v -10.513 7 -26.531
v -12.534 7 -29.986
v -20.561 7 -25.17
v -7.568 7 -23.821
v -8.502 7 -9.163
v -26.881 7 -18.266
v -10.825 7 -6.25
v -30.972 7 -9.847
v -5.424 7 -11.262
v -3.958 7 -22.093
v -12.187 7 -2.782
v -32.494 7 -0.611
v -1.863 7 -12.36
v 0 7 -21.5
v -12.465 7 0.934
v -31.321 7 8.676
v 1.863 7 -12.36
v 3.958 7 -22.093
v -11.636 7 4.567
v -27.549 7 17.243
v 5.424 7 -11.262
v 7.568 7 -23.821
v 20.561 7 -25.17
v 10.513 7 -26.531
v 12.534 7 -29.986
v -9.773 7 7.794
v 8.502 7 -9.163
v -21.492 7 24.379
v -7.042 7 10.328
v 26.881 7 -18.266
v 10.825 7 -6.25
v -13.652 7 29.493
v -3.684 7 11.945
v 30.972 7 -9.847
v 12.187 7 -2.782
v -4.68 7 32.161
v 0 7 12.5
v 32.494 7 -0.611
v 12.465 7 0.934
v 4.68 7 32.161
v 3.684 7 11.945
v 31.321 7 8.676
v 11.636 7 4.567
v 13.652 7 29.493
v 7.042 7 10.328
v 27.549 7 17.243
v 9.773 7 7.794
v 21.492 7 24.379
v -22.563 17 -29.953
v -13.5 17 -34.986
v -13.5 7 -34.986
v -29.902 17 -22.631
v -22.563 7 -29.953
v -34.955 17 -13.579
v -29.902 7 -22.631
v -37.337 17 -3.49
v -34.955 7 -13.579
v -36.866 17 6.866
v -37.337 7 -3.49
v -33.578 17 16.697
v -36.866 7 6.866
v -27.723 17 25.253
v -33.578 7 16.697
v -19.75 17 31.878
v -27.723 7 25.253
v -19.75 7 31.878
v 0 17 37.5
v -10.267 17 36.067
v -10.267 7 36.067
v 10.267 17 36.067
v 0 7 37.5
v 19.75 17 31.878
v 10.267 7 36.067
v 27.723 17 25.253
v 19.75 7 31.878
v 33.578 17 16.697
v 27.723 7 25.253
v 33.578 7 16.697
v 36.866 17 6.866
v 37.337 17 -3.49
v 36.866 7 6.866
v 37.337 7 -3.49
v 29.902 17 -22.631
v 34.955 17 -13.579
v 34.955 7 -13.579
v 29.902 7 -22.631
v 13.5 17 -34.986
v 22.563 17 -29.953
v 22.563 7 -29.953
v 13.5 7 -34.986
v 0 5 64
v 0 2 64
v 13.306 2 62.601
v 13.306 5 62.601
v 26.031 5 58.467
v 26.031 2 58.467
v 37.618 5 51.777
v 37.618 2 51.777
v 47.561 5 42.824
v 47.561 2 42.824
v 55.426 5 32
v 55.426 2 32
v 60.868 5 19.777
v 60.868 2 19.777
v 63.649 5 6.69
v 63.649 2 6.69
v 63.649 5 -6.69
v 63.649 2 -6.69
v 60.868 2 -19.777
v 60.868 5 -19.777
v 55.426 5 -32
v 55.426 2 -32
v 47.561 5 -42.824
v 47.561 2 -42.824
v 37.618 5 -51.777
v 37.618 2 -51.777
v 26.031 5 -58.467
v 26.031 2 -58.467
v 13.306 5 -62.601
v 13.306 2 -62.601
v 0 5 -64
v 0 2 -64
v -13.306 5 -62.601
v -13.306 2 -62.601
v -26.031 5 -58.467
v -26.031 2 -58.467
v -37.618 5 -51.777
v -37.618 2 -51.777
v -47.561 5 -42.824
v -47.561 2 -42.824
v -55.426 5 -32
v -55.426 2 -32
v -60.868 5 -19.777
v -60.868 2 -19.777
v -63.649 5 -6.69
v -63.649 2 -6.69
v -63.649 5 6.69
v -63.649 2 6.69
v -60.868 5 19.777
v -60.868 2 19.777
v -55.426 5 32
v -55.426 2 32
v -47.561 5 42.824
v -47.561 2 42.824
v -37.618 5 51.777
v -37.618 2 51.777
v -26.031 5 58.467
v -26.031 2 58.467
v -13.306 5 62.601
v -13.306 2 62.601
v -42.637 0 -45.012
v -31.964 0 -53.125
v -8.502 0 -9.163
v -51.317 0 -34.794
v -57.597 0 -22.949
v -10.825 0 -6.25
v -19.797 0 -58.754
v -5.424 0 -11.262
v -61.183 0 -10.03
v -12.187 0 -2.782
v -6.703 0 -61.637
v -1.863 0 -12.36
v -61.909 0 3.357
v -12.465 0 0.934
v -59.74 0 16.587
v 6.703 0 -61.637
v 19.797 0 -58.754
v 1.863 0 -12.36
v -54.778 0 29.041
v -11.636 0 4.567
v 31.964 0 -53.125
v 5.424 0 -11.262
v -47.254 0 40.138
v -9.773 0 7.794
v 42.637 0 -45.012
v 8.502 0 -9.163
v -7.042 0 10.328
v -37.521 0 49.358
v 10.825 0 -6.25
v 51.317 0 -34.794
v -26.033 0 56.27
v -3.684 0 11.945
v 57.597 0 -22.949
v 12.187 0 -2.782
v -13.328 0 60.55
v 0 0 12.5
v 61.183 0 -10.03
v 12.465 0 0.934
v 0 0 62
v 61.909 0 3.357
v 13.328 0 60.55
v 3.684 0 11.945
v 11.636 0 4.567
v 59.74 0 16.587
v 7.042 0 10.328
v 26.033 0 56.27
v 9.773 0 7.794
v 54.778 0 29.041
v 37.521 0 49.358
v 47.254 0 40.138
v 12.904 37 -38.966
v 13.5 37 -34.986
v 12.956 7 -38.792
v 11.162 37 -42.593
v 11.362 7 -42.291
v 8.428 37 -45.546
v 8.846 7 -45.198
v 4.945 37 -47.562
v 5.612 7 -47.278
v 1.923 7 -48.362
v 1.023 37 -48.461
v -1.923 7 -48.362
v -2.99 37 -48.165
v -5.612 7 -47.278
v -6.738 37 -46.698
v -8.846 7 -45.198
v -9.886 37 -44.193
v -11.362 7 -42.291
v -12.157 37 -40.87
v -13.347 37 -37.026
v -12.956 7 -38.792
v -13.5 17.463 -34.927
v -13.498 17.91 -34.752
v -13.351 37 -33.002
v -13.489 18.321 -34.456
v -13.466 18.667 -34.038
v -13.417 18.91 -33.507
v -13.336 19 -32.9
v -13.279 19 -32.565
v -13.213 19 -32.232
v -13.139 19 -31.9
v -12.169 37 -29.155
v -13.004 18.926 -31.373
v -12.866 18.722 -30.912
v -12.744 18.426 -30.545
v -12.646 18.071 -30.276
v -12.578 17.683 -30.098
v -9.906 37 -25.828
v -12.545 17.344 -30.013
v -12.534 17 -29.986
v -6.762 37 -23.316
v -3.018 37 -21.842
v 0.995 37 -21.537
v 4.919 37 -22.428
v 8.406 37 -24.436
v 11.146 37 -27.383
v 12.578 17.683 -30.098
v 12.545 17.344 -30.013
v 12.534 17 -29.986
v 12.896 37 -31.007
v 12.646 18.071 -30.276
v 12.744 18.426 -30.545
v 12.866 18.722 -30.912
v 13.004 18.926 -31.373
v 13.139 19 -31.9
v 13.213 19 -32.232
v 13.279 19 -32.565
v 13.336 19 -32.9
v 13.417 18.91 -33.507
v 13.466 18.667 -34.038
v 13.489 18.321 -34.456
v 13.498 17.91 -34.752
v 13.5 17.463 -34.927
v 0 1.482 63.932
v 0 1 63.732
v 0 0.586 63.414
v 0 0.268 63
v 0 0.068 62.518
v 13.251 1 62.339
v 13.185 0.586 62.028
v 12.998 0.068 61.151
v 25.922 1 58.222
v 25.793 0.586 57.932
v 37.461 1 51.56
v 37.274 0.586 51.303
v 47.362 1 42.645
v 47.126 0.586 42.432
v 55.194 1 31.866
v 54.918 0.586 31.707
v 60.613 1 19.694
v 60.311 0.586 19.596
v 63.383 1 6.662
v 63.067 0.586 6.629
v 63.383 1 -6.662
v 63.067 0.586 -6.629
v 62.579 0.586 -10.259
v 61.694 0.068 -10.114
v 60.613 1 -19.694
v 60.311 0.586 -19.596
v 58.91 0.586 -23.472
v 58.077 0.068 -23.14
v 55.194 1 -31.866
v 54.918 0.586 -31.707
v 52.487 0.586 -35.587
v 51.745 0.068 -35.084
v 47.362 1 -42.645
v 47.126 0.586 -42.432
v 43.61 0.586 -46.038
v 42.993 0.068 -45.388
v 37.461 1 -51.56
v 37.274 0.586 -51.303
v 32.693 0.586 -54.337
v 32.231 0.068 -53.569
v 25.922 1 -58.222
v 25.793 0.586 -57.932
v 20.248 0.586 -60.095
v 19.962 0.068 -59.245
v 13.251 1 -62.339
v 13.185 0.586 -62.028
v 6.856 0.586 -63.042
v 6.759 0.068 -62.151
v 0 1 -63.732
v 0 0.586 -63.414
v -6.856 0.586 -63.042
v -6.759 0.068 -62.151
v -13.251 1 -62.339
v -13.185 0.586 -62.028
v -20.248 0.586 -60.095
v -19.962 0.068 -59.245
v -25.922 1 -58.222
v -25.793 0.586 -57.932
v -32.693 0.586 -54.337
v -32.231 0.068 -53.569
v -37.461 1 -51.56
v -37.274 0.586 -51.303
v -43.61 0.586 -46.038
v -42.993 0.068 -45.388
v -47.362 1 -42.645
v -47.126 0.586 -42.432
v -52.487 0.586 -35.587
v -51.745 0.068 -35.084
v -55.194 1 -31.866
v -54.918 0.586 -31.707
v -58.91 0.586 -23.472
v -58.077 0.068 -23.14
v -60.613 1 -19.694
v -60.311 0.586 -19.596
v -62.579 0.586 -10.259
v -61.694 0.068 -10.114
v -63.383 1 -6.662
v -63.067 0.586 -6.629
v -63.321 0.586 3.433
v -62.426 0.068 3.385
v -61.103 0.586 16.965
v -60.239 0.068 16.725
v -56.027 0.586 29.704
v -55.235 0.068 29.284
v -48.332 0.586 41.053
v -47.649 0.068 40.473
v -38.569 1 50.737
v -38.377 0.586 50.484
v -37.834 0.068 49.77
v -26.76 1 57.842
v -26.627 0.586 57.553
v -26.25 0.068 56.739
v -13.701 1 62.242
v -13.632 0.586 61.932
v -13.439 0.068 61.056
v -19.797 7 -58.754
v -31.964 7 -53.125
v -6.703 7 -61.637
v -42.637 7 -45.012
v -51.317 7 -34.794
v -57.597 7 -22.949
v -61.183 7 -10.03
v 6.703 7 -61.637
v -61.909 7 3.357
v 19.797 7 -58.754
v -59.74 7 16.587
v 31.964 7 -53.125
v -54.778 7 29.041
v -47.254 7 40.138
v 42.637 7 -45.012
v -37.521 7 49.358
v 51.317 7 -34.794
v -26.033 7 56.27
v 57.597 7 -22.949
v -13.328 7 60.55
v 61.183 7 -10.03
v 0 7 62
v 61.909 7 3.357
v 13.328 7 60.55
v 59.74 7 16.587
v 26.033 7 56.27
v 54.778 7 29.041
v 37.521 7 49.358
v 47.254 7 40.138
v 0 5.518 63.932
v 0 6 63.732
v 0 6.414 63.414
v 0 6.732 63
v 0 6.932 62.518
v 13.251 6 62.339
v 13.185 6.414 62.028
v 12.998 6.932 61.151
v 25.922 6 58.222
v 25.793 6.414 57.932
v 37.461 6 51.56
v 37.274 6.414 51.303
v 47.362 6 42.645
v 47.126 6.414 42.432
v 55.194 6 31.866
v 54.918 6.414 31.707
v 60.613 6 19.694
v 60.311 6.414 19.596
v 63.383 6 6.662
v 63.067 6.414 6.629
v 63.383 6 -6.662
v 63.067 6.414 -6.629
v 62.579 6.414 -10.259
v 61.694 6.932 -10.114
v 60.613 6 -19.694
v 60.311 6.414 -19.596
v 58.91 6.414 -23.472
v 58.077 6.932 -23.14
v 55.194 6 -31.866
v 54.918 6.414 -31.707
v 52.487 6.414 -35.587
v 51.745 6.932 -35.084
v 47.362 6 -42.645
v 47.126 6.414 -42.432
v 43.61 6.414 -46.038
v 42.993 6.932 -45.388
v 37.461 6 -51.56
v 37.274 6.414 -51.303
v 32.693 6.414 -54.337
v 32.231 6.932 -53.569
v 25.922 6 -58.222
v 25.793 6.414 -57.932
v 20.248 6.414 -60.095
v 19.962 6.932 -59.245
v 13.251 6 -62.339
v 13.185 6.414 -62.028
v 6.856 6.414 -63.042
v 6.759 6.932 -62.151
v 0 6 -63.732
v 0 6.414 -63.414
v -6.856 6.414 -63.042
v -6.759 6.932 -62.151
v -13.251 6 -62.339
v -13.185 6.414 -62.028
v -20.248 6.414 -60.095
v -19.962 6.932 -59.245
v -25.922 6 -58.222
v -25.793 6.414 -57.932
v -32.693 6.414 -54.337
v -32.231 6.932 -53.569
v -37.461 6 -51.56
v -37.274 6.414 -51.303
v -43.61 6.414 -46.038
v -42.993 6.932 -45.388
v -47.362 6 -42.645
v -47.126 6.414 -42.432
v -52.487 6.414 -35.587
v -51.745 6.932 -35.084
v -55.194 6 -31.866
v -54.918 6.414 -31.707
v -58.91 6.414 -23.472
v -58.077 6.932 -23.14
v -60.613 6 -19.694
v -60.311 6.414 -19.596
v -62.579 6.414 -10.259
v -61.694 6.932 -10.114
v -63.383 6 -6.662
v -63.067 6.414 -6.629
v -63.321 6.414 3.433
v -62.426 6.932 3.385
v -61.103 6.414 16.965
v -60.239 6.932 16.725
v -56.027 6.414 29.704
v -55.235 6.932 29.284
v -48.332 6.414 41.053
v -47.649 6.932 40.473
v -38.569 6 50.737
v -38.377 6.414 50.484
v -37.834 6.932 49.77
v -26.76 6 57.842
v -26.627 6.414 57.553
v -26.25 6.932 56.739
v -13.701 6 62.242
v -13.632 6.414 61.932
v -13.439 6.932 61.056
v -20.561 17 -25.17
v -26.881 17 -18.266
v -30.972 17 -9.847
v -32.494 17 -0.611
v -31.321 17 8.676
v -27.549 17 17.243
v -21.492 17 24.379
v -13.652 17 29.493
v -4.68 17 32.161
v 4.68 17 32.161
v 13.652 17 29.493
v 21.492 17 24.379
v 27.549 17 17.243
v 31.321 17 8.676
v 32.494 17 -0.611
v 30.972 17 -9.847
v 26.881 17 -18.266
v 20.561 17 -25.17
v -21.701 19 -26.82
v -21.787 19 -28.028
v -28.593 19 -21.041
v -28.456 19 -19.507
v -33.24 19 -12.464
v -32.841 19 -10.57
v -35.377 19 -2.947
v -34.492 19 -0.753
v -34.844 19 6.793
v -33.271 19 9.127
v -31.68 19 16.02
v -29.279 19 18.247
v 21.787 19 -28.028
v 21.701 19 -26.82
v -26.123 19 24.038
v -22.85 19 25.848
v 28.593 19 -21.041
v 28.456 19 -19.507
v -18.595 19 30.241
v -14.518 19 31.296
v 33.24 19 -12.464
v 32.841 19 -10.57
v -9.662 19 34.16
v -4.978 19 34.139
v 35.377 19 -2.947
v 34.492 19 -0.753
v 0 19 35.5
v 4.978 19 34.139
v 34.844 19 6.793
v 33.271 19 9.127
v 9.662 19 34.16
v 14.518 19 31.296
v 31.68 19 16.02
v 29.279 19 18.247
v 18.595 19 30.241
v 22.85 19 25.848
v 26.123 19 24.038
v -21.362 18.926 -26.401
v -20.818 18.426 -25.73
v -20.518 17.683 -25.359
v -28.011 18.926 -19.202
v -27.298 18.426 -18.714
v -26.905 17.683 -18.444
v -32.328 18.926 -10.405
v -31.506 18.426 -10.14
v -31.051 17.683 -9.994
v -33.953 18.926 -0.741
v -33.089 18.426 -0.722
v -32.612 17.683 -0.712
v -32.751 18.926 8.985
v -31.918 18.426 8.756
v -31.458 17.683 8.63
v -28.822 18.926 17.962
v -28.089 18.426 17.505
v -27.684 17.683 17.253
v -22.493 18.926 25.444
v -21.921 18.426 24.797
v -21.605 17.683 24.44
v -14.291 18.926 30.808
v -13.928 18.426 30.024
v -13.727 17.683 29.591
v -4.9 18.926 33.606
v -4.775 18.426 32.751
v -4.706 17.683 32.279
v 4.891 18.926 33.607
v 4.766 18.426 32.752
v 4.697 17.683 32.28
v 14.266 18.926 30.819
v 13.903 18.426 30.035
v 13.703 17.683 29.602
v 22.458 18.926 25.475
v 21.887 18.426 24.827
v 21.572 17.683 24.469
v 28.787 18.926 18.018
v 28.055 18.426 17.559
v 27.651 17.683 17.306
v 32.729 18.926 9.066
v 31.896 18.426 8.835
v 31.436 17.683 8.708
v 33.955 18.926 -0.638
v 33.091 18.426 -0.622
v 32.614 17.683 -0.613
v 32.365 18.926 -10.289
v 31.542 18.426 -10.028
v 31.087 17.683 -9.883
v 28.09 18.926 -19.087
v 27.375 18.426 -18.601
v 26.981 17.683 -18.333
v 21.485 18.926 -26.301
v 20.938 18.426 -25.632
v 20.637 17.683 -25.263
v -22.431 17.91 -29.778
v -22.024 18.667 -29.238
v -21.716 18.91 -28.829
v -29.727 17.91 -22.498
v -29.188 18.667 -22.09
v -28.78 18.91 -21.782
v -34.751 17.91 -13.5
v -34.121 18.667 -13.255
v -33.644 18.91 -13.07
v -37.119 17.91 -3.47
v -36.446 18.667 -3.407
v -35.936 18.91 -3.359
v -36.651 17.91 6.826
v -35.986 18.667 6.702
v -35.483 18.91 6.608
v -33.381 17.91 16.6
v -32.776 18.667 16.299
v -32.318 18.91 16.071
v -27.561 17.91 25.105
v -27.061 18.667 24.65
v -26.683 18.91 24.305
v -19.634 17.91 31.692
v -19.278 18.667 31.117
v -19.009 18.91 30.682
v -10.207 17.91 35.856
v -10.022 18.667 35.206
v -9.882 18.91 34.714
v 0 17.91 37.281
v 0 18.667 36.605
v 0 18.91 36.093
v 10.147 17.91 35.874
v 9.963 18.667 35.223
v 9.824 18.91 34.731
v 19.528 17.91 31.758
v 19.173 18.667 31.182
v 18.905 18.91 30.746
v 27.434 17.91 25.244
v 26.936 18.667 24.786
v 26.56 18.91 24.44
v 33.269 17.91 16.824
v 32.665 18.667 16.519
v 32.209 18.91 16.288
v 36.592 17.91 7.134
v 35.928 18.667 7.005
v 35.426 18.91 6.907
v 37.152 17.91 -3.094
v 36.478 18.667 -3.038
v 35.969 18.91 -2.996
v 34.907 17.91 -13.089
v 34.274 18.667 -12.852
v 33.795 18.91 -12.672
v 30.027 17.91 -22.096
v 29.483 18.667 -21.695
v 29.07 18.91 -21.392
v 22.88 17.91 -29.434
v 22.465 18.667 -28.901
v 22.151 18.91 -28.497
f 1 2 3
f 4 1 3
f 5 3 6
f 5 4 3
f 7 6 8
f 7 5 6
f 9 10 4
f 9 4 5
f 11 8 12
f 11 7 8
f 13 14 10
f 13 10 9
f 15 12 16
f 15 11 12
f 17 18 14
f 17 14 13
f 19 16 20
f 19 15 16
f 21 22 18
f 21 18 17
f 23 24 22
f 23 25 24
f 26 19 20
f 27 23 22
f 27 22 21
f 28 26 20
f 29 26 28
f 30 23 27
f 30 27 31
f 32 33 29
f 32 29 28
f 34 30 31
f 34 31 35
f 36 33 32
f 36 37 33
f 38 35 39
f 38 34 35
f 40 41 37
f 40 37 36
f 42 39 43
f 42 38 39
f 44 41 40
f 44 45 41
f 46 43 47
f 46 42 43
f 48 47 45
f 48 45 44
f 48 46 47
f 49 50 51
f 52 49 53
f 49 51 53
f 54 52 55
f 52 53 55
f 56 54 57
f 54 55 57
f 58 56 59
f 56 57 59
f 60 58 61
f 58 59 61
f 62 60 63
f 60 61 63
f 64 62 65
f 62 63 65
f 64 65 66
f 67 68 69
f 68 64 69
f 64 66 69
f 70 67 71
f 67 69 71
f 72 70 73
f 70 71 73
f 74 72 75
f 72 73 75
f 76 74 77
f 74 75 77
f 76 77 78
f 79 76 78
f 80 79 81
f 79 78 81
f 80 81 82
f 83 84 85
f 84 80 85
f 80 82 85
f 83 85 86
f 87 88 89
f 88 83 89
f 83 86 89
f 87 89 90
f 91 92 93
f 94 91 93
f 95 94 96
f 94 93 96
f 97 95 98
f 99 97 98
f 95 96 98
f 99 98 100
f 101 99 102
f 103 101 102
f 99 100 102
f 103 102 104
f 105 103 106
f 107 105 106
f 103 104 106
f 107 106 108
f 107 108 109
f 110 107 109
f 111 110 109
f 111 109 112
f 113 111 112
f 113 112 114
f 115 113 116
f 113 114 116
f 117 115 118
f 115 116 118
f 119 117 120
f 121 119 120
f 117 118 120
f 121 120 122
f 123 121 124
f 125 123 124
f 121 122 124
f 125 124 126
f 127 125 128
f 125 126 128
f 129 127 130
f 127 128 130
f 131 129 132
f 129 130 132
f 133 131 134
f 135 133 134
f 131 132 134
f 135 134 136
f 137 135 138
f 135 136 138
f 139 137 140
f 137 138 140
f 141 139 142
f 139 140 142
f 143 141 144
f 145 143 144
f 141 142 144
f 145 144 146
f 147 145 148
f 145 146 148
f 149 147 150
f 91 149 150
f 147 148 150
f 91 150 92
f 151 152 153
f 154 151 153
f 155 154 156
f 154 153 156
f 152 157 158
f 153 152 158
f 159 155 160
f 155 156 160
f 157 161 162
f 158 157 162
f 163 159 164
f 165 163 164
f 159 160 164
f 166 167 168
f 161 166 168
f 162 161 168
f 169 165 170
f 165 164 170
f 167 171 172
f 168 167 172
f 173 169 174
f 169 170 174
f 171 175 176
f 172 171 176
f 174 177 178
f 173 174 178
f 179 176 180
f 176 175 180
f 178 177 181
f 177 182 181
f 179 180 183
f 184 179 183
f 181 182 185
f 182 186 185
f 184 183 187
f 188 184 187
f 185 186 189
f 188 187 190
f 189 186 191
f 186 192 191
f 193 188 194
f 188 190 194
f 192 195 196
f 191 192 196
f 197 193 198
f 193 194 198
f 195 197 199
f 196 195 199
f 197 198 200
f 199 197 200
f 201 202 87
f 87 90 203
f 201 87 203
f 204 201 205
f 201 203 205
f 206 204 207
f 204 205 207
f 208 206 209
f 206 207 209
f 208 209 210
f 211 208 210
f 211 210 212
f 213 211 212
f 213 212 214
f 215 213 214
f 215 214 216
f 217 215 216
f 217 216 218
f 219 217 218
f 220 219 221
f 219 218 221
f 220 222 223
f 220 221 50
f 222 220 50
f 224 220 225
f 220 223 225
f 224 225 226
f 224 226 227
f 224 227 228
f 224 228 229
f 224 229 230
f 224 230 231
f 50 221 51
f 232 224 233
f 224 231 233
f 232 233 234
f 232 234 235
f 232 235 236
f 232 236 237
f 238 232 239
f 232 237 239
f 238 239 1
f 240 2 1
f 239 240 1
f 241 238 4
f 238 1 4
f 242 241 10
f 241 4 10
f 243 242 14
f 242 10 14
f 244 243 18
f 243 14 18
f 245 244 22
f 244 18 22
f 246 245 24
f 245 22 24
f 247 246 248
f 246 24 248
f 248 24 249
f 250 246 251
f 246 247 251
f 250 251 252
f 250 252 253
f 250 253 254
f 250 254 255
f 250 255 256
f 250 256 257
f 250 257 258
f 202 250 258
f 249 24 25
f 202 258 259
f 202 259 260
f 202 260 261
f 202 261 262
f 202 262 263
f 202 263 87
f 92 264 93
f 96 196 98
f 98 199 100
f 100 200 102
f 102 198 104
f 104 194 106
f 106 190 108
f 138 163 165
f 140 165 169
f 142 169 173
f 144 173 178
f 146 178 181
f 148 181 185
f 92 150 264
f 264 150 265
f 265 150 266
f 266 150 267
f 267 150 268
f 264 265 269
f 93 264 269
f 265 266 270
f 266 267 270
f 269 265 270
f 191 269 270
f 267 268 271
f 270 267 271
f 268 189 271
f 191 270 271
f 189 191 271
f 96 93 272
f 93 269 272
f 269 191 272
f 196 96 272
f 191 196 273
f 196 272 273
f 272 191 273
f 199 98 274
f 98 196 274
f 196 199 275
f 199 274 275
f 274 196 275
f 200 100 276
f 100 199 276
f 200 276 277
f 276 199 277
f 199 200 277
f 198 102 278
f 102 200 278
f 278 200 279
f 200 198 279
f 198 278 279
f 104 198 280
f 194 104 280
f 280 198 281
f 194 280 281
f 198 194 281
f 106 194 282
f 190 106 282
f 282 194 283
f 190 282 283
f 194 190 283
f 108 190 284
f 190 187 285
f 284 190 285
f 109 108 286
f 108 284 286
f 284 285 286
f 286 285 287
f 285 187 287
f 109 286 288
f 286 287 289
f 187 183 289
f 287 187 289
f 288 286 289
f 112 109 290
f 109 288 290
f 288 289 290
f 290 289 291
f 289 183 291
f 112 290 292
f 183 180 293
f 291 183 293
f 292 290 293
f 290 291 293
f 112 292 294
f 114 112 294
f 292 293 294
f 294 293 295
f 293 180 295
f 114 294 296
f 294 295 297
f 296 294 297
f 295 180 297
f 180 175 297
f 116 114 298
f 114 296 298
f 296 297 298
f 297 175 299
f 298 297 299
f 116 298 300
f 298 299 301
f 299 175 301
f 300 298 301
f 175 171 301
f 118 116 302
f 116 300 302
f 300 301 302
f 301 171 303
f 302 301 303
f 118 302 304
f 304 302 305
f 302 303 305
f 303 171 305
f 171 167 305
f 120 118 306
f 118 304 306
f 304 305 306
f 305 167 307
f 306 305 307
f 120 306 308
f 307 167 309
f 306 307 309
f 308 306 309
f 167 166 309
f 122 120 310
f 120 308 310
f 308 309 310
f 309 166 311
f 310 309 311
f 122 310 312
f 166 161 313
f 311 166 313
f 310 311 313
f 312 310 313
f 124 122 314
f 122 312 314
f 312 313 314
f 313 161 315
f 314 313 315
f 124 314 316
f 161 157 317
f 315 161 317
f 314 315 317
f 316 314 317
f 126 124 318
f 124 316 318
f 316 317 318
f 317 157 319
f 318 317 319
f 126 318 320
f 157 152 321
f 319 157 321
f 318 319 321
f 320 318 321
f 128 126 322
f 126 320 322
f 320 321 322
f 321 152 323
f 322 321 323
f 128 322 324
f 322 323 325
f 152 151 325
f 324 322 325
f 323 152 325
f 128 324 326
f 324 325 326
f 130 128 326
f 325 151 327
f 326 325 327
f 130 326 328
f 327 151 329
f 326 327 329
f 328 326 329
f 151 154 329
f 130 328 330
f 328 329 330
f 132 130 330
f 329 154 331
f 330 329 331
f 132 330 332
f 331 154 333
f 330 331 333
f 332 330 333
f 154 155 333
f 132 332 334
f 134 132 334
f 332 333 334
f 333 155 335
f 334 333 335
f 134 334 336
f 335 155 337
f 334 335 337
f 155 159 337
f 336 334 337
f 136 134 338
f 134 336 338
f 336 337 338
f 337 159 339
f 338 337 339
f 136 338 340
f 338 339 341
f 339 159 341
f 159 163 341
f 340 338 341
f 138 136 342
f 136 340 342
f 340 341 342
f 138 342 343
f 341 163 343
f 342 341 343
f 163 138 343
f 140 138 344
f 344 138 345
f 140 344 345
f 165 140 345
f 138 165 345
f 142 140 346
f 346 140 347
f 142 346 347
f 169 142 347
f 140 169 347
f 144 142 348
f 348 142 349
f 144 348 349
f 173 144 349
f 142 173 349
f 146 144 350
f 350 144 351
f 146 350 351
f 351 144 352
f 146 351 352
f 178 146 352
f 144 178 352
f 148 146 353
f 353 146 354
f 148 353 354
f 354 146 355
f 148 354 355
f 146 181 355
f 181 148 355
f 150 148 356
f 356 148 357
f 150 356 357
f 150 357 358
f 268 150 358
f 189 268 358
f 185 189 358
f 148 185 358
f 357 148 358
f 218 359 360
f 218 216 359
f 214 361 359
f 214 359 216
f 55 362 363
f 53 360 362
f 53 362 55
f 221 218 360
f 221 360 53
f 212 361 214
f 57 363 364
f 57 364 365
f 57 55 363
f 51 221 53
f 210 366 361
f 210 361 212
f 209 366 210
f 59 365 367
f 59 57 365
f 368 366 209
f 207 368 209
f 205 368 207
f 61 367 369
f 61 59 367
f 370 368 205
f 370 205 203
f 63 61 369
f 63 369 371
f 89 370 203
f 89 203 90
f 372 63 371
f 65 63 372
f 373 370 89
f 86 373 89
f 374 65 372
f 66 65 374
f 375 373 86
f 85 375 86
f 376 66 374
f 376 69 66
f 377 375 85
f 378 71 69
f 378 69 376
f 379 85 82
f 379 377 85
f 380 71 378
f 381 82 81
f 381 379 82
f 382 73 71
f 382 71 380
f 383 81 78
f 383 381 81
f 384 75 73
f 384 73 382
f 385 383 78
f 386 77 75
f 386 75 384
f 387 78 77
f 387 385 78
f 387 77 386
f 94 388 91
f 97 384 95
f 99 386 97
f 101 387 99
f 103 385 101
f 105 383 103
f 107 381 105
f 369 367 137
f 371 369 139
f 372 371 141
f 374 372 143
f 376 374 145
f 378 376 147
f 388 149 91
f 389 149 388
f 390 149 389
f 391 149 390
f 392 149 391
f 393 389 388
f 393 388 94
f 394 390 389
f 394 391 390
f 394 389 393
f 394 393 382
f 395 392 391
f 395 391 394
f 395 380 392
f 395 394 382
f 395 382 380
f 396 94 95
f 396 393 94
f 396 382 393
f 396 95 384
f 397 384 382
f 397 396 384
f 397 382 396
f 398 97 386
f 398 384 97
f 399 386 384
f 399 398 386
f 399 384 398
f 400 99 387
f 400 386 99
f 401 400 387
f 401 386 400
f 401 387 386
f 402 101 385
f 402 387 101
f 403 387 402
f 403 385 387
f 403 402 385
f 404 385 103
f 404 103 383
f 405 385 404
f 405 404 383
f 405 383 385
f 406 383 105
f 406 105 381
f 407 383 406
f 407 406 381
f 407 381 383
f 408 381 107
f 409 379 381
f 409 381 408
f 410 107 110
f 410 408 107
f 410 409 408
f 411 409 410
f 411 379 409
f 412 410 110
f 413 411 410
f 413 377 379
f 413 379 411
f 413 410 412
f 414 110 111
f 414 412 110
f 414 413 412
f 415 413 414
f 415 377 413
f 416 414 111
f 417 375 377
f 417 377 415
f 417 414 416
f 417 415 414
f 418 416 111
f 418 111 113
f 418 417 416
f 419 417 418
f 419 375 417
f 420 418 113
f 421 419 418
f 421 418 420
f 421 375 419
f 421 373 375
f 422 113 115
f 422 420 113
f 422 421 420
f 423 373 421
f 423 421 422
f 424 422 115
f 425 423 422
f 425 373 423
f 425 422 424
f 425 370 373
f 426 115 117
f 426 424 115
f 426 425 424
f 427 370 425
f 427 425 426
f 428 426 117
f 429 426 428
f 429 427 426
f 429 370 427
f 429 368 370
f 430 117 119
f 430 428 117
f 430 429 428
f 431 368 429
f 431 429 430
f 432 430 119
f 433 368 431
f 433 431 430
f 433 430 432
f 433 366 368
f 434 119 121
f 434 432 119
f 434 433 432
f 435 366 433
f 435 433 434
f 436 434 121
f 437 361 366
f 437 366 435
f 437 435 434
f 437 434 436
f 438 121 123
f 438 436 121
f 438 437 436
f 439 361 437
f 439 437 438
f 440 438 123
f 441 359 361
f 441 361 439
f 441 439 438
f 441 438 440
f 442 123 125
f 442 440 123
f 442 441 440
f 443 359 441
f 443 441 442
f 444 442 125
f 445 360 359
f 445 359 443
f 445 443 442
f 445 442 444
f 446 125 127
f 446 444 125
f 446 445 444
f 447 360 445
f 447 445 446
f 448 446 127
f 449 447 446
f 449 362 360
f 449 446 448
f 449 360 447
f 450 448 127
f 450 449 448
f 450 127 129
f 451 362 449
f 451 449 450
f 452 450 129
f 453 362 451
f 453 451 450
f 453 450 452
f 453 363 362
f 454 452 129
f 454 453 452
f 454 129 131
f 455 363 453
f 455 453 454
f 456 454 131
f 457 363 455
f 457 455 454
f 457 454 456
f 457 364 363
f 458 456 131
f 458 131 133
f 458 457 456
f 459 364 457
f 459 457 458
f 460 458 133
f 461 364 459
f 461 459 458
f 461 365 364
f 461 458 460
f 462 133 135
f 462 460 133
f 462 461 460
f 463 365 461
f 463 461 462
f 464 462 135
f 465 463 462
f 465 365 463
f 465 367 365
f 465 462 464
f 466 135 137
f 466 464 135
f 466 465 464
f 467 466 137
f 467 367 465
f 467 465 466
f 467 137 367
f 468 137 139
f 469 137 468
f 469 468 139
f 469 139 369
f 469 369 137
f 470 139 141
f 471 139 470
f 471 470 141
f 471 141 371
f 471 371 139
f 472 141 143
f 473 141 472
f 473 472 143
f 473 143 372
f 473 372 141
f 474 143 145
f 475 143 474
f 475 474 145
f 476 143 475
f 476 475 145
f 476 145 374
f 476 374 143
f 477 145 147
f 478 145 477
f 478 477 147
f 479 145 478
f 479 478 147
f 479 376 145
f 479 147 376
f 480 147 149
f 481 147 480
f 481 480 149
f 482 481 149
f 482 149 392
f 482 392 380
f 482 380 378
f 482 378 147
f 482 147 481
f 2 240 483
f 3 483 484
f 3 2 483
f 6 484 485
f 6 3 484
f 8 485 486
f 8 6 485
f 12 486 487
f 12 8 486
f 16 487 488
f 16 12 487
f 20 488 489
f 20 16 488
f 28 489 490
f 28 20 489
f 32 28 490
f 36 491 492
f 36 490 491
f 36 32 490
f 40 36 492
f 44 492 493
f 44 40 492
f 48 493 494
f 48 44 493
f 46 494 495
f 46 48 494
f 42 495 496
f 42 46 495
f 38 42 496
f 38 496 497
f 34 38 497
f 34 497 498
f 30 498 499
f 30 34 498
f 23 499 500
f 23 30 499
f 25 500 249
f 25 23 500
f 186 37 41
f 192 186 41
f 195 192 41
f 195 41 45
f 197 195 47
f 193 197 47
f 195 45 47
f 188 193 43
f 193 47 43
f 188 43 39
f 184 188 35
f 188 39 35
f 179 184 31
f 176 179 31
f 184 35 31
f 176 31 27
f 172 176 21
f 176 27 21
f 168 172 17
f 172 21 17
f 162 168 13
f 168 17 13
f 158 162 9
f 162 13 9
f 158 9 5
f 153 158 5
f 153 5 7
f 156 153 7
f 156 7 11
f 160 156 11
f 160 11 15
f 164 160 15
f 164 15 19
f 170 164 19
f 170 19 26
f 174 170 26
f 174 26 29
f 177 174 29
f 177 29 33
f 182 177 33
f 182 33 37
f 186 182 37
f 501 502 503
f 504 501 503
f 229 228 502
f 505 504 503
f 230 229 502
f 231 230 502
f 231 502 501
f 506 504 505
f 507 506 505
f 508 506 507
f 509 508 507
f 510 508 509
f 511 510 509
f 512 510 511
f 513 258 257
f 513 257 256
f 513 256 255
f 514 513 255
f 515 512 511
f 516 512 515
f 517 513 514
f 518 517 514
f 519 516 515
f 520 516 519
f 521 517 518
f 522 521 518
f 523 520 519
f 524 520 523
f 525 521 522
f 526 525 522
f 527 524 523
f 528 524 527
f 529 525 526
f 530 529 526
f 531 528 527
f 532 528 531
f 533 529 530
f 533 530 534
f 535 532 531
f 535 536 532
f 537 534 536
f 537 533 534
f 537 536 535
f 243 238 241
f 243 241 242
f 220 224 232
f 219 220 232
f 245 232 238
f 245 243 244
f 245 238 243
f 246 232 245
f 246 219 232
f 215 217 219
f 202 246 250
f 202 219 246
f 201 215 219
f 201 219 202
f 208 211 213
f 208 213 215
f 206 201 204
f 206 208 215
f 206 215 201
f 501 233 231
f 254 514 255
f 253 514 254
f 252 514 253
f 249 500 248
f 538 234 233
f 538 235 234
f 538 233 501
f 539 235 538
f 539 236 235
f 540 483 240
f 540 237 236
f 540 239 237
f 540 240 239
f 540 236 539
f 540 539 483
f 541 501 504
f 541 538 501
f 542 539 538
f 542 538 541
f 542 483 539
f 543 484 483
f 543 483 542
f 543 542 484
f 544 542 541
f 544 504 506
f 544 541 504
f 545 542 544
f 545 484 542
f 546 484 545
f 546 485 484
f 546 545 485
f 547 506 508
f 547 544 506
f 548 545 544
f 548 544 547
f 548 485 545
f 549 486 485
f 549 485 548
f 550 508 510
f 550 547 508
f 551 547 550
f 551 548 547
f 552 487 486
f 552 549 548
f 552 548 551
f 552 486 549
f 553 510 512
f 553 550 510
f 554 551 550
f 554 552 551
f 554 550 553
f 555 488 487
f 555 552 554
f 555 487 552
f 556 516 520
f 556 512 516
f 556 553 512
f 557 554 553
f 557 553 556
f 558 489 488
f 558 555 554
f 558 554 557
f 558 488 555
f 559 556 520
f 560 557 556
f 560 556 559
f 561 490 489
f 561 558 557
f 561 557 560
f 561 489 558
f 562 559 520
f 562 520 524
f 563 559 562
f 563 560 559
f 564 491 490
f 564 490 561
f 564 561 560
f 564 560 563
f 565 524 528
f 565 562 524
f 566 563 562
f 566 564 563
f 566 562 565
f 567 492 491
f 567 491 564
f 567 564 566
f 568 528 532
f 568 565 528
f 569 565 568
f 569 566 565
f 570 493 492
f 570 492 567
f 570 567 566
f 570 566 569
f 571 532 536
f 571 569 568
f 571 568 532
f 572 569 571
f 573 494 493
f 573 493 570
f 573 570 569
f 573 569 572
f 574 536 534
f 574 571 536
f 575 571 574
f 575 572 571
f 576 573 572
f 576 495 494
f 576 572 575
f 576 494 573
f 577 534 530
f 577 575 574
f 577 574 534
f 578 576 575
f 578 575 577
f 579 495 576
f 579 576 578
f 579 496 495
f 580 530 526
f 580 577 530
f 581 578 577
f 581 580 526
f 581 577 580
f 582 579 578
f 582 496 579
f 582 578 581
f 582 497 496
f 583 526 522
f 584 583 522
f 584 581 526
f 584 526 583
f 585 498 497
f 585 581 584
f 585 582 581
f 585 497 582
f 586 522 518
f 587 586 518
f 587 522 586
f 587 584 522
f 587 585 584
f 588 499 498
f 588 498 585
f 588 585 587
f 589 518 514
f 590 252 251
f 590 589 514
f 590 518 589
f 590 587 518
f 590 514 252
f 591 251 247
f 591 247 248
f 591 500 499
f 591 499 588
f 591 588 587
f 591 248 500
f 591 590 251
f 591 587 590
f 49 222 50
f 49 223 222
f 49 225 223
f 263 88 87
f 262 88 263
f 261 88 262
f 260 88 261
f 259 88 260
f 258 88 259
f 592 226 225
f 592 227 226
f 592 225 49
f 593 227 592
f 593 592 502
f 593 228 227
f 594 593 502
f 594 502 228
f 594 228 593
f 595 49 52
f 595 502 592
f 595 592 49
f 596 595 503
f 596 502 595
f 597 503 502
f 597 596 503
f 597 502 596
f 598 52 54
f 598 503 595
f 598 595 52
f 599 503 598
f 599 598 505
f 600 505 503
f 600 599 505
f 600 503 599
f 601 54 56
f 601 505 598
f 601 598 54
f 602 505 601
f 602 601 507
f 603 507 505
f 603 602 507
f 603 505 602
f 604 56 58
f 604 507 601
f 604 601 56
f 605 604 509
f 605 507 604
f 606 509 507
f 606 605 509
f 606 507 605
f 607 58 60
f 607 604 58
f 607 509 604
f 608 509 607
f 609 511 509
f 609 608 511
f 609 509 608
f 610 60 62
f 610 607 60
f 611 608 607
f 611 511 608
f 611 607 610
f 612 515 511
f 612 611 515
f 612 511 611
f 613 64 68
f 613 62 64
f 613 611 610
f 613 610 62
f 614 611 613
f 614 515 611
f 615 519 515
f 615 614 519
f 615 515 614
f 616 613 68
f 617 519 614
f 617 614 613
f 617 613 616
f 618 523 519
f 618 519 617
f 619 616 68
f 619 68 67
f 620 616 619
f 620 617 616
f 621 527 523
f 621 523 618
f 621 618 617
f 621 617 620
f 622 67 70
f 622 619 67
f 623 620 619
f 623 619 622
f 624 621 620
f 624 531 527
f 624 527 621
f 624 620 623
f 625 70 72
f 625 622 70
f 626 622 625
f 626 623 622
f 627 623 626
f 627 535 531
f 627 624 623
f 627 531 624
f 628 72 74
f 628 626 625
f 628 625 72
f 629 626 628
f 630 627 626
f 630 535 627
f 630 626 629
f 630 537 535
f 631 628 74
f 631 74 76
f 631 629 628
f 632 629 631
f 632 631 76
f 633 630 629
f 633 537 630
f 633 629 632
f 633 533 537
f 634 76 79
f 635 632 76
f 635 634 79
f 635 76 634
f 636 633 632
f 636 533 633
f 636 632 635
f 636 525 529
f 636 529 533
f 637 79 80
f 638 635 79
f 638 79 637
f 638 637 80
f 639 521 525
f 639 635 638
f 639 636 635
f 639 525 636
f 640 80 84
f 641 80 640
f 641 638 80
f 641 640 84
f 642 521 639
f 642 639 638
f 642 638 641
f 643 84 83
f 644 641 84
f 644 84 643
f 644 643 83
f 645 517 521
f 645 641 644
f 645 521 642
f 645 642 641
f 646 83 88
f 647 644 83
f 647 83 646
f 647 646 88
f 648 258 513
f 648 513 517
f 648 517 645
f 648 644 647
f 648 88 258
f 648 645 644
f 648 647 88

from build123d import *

# Parameters (mm, degrees)
SKETCH1_R           = 64
BOSS_EXTRUDE1_DEPTH = 7
SKETCH2_R           = 37.5
SKETCH2_R_2         = 32.5
BOSS_EXTRUDE2_DEPTH = 12
SKETCH3_R           = 12.5
CUT_EXTRUDE1_DEPTH  = 92.301697684
FILLET1_R           = 2
SKETCH17_R          = 13.5
BOSS_EXTRUDE3_DEPTH = 30


with BuildPart() as part:
    # Sketch1 → Boss-Extrude1 (new body)
    with BuildSketch(Plane(origin=(0, 0, 0), x_dir=(1, 0, 0), z_dir=(0, 1, 0))):
        with Locations(Location((0, 0, 0), (0, 0, 270))):
            Circle(SKETCH1_R)
    extrude(amount=BOSS_EXTRUDE1_DEPTH)

    # Sketch2 → Boss-Extrude2 (add)
    with BuildSketch(Plane(origin=(0, 7, 0), x_dir=(1, 0, 0), z_dir=(0, 1, 0))):
        with Locations(Location((0, 0, 0), (0, 0, 270))):
            Circle(SKETCH2_R)
        with Locations(Location((0, 0, 0), (0, 0, 270))):
            Circle(SKETCH2_R_2, mode=Mode.SUBTRACT)
    extrude(amount=BOSS_EXTRUDE2_DEPTH)

    # Sketch3 → Cut-Extrude1 (cut, through all)
    with BuildSketch(Plane(origin=(0, 7, 0), x_dir=(1, 0, 0), z_dir=(0, 1, 0))):
        with Locations(Location((0, 0, 0), (0, 0, 270))):
            Circle(SKETCH3_R)
    extrude(amount=-CUT_EXTRUDE1_DEPTH, mode=Mode.SUBTRACT)

    # Fillet1
    fillet1_edges = [part.edges().sort_by_distance(p)[0] for p in [
        (0, 0, -64),
        (0, 7, -64),
        (0, 19, -37.5),
        (0, 19, -32.5),
    ]]
    fillet(fillet1_edges, radius=FILLET1_R)

    # Sketch17 → Boss-Extrude3 (add)
    with BuildSketch(Plane(origin=(0, 7, 0), x_dir=(1, 0, 0), z_dir=(0, 1, 0))):
        with Locations(Location((0, 35, 0), (0, 0, 359.939369671))):
            Circle(SKETCH17_R)
    extrude(amount=BOSS_EXTRUDE3_DEPTH)


solid = part.part
